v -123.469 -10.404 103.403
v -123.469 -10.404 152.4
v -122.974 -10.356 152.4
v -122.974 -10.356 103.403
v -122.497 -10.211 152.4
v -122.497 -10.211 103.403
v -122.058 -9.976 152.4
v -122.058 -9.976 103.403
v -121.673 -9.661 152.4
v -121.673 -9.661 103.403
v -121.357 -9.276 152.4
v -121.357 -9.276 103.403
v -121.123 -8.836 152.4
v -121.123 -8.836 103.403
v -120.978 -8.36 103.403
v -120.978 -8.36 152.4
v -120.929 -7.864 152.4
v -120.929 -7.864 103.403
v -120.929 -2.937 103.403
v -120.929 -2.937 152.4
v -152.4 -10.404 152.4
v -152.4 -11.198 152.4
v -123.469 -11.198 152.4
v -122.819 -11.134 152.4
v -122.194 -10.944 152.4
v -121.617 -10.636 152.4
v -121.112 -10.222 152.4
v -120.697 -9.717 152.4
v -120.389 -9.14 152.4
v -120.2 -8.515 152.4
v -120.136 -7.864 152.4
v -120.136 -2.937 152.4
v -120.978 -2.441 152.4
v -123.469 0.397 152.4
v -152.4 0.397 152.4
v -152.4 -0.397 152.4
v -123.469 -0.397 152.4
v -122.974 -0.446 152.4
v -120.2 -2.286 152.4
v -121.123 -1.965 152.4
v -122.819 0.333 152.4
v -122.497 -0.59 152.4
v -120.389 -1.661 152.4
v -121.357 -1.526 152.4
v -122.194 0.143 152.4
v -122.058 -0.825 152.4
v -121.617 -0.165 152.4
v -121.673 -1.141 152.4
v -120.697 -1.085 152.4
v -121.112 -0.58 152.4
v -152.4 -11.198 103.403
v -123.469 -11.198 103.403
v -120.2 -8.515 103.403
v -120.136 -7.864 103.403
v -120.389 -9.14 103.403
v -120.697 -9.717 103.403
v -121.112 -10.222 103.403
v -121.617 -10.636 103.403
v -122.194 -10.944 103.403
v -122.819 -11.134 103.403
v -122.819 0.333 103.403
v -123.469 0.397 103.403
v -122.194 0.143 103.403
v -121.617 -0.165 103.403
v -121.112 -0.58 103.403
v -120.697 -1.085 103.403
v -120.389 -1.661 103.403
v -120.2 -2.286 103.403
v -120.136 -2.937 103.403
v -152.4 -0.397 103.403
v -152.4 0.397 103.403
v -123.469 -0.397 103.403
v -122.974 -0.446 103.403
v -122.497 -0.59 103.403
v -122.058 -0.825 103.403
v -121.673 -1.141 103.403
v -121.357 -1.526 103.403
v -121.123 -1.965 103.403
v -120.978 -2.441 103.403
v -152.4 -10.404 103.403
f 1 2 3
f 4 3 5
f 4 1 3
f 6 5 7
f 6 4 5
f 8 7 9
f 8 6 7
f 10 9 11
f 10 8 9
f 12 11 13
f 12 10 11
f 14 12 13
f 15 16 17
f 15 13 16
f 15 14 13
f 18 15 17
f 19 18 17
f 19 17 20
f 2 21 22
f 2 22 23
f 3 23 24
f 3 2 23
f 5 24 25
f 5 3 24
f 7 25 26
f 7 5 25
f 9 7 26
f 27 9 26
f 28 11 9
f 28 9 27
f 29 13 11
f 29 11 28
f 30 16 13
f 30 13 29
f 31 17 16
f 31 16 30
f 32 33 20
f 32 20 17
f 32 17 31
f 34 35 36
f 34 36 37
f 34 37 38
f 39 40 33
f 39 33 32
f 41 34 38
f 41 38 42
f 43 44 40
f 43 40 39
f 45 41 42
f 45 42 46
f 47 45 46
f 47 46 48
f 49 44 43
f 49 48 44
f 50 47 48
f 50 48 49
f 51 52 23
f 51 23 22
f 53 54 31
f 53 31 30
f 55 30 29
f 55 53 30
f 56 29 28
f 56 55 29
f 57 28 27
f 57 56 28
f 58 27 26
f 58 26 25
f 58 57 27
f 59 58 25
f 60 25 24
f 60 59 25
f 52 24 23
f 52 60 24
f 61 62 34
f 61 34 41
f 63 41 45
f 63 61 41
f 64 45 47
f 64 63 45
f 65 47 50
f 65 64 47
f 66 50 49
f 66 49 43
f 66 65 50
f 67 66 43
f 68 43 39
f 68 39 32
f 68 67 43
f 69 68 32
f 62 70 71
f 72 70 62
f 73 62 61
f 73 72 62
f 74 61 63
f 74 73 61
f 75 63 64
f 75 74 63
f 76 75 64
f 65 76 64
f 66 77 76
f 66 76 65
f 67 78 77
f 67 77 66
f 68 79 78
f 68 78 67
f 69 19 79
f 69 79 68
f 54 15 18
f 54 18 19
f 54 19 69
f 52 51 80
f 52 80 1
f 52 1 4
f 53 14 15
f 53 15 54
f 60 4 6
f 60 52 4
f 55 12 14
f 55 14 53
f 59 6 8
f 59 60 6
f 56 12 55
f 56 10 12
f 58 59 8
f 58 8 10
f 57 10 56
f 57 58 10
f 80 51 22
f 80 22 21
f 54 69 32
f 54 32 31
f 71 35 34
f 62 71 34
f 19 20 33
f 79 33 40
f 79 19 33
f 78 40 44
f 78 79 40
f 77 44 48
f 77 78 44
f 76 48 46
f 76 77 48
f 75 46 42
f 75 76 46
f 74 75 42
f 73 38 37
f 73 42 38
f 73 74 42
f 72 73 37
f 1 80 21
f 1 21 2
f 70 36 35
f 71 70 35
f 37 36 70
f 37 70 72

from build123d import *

# Parameters (mm, degrees)
SKETCH3_W                       = 304.8
SKETCH3_H                       = 0.79375
BOSS_EXTRUDE1_DEPTH             = 152.4
BOSS_EXTRUDE1_DEPTH_BACK        = 152.4
SKETCH4_OUTSIDE_W               = 393.01
SKETCH4_OUTSIDE_H               = 393.01
SKETCH4_OUTSIDE_W_2             = 28.9306
SKETCH4_OUTSIDE_H_2             = 48.9966
CUT_EXTRUDE1_DEPTH              = 1.396875
CUT_EXTRUDE1_DEPTH_BACK         = 1.396875
EXTRUDE_THIN1_REACH             = 26.498
EXTRUDE_THIN1_DIRECTION_2_REACH = 26.498


with BuildPart() as part:
    # Sketch3 → Boss-Extrude1 (new body, two sides)
    with BuildSketch(Plane.XY) as boss_extrude1_sk:
        Rectangle(SKETCH3_W, SKETCH3_H)
    extrude(amount=BOSS_EXTRUDE1_DEPTH)
    extrude(boss_extrude1_sk.sketch, amount=-BOSS_EXTRUDE1_DEPTH_BACK)

    # Sketch4 outside → Cut-Extrude1 (cut, two sides)
    with BuildSketch(Plane(origin=(0, 0, 0), x_dir=(1, 0, 0), z_dir=(0, 1, 0))) as cut_extrude1_sk:
        Rectangle(SKETCH4_OUTSIDE_W, SKETCH4_OUTSIDE_H)
        with Locations((-137.9347, -127.9017)):
            Rectangle(SKETCH4_OUTSIDE_W_2, SKETCH4_OUTSIDE_H_2, mode=Mode.SUBTRACT)
    extrude(amount=CUT_EXTRUDE1_DEPTH, mode=Mode.SUBTRACT)
    extrude(cut_extrude1_sk.sketch, amount=-CUT_EXTRUDE1_DEPTH_BACK, mode=Mode.SUBTRACT)

    # Extrude-Thin1: up to this face of the body (flat: up to its plane)
    extrude_thin1_end = Plane(part.part.faces().sort_by_distance((-137.9347, 0, 103.4034))[0])
    # Sketch5 → Extrude-Thin1 (add, up to the picked face)
    with BuildSketch(Plane.XY.offset(127.9017), mode=Mode.PRIVATE) as extrude_thin1_sk1:
        with BuildLine():
            Line((-152.4, -10.404475), (-123.4694, -10.404475))
            ThreePointArc((-123.4694, -10.404475), (-121.673348776, -9.660526224), (-120.9294, -7.864475))
            Line((-120.9294, -7.864475), (-120.9294, -2.936875))
            ThreePointArc((-120.9294, -2.936875), (-121.673348776, -1.140823776), (-123.4694, -0.396875))
            Line((-123.4694, -0.396875), (-123.4694, 0.396875))
            ThreePointArc((-123.4694, 0.396875), (-121.112082768, -0.579557768), (-120.13565, -2.936875))
            Line((-120.13565, -2.936875), (-120.13565, -7.864475))
            ThreePointArc((-120.13565, -7.864475), (-121.112082768, -10.221792232), (-123.4694, -11.198225))
            Line((-123.4694, -11.198225), (-152.4, -11.198225))
            Line((-152.4, -11.198225), (-152.4, -10.404475))
        make_face()
    extrude_thin1_tool1 = split(extrude(extrude_thin1_sk1.sketch, amount=-EXTRUDE_THIN1_REACH, mode=Mode.PRIVATE), bisect_by=extrude_thin1_end, keep=Keep.BOTH, mode=Mode.PRIVATE)
    add(extrude_thin1_tool1.solids().sort_by_distance((-137.9347, -10.855379, 127.9017))[0])

    # Extrude-Thin1 direction 2: up to this face of the body (flat: up to its plane)
    extrude_thin1_direction_2_end = Plane(part.part.faces().sort_by_distance((-137.9347, 0, 152.4))[0])
    # Sketch5 → Extrude-Thin1 direction 2 (add, up to the picked face)
    with BuildSketch(Plane.XY.offset(127.9017), mode=Mode.PRIVATE) as extrude_thin1_direction_2_sk1:
        with BuildLine():
            Line((-152.4, -10.404475), (-123.4694, -10.404475))
            ThreePointArc((-123.4694, -10.404475), (-121.673348776, -9.660526224), (-120.9294, -7.864475))
            Line((-120.9294, -7.864475), (-120.9294, -2.936875))
            ThreePointArc((-120.9294, -2.936875), (-121.673348776, -1.140823776), (-123.4694, -0.396875))
            Line((-123.4694, -0.396875), (-123.4694, 0.396875))
            ThreePointArc((-123.4694, 0.396875), (-121.112082768, -0.579557768), (-120.13565, -2.936875))
            Line((-120.13565, -2.936875), (-120.13565, -7.864475))
            ThreePointArc((-120.13565, -7.864475), (-121.112082768, -10.221792232), (-123.4694, -11.198225))
            Line((-123.4694, -11.198225), (-152.4, -11.198225))
            Line((-152.4, -11.198225), (-152.4, -10.404475))
        make_face()
    extrude_thin1_direction_2_tool1 = split(extrude(extrude_thin1_direction_2_sk1.sketch, amount=EXTRUDE_THIN1_DIRECTION_2_REACH, mode=Mode.PRIVATE), bisect_by=extrude_thin1_direction_2_end, keep=Keep.BOTH, mode=Mode.PRIVATE)
    add(extrude_thin1_direction_2_tool1.solids().sort_by_distance((-137.9347, -10.855379, 127.9017))[0])


solid = part.part
